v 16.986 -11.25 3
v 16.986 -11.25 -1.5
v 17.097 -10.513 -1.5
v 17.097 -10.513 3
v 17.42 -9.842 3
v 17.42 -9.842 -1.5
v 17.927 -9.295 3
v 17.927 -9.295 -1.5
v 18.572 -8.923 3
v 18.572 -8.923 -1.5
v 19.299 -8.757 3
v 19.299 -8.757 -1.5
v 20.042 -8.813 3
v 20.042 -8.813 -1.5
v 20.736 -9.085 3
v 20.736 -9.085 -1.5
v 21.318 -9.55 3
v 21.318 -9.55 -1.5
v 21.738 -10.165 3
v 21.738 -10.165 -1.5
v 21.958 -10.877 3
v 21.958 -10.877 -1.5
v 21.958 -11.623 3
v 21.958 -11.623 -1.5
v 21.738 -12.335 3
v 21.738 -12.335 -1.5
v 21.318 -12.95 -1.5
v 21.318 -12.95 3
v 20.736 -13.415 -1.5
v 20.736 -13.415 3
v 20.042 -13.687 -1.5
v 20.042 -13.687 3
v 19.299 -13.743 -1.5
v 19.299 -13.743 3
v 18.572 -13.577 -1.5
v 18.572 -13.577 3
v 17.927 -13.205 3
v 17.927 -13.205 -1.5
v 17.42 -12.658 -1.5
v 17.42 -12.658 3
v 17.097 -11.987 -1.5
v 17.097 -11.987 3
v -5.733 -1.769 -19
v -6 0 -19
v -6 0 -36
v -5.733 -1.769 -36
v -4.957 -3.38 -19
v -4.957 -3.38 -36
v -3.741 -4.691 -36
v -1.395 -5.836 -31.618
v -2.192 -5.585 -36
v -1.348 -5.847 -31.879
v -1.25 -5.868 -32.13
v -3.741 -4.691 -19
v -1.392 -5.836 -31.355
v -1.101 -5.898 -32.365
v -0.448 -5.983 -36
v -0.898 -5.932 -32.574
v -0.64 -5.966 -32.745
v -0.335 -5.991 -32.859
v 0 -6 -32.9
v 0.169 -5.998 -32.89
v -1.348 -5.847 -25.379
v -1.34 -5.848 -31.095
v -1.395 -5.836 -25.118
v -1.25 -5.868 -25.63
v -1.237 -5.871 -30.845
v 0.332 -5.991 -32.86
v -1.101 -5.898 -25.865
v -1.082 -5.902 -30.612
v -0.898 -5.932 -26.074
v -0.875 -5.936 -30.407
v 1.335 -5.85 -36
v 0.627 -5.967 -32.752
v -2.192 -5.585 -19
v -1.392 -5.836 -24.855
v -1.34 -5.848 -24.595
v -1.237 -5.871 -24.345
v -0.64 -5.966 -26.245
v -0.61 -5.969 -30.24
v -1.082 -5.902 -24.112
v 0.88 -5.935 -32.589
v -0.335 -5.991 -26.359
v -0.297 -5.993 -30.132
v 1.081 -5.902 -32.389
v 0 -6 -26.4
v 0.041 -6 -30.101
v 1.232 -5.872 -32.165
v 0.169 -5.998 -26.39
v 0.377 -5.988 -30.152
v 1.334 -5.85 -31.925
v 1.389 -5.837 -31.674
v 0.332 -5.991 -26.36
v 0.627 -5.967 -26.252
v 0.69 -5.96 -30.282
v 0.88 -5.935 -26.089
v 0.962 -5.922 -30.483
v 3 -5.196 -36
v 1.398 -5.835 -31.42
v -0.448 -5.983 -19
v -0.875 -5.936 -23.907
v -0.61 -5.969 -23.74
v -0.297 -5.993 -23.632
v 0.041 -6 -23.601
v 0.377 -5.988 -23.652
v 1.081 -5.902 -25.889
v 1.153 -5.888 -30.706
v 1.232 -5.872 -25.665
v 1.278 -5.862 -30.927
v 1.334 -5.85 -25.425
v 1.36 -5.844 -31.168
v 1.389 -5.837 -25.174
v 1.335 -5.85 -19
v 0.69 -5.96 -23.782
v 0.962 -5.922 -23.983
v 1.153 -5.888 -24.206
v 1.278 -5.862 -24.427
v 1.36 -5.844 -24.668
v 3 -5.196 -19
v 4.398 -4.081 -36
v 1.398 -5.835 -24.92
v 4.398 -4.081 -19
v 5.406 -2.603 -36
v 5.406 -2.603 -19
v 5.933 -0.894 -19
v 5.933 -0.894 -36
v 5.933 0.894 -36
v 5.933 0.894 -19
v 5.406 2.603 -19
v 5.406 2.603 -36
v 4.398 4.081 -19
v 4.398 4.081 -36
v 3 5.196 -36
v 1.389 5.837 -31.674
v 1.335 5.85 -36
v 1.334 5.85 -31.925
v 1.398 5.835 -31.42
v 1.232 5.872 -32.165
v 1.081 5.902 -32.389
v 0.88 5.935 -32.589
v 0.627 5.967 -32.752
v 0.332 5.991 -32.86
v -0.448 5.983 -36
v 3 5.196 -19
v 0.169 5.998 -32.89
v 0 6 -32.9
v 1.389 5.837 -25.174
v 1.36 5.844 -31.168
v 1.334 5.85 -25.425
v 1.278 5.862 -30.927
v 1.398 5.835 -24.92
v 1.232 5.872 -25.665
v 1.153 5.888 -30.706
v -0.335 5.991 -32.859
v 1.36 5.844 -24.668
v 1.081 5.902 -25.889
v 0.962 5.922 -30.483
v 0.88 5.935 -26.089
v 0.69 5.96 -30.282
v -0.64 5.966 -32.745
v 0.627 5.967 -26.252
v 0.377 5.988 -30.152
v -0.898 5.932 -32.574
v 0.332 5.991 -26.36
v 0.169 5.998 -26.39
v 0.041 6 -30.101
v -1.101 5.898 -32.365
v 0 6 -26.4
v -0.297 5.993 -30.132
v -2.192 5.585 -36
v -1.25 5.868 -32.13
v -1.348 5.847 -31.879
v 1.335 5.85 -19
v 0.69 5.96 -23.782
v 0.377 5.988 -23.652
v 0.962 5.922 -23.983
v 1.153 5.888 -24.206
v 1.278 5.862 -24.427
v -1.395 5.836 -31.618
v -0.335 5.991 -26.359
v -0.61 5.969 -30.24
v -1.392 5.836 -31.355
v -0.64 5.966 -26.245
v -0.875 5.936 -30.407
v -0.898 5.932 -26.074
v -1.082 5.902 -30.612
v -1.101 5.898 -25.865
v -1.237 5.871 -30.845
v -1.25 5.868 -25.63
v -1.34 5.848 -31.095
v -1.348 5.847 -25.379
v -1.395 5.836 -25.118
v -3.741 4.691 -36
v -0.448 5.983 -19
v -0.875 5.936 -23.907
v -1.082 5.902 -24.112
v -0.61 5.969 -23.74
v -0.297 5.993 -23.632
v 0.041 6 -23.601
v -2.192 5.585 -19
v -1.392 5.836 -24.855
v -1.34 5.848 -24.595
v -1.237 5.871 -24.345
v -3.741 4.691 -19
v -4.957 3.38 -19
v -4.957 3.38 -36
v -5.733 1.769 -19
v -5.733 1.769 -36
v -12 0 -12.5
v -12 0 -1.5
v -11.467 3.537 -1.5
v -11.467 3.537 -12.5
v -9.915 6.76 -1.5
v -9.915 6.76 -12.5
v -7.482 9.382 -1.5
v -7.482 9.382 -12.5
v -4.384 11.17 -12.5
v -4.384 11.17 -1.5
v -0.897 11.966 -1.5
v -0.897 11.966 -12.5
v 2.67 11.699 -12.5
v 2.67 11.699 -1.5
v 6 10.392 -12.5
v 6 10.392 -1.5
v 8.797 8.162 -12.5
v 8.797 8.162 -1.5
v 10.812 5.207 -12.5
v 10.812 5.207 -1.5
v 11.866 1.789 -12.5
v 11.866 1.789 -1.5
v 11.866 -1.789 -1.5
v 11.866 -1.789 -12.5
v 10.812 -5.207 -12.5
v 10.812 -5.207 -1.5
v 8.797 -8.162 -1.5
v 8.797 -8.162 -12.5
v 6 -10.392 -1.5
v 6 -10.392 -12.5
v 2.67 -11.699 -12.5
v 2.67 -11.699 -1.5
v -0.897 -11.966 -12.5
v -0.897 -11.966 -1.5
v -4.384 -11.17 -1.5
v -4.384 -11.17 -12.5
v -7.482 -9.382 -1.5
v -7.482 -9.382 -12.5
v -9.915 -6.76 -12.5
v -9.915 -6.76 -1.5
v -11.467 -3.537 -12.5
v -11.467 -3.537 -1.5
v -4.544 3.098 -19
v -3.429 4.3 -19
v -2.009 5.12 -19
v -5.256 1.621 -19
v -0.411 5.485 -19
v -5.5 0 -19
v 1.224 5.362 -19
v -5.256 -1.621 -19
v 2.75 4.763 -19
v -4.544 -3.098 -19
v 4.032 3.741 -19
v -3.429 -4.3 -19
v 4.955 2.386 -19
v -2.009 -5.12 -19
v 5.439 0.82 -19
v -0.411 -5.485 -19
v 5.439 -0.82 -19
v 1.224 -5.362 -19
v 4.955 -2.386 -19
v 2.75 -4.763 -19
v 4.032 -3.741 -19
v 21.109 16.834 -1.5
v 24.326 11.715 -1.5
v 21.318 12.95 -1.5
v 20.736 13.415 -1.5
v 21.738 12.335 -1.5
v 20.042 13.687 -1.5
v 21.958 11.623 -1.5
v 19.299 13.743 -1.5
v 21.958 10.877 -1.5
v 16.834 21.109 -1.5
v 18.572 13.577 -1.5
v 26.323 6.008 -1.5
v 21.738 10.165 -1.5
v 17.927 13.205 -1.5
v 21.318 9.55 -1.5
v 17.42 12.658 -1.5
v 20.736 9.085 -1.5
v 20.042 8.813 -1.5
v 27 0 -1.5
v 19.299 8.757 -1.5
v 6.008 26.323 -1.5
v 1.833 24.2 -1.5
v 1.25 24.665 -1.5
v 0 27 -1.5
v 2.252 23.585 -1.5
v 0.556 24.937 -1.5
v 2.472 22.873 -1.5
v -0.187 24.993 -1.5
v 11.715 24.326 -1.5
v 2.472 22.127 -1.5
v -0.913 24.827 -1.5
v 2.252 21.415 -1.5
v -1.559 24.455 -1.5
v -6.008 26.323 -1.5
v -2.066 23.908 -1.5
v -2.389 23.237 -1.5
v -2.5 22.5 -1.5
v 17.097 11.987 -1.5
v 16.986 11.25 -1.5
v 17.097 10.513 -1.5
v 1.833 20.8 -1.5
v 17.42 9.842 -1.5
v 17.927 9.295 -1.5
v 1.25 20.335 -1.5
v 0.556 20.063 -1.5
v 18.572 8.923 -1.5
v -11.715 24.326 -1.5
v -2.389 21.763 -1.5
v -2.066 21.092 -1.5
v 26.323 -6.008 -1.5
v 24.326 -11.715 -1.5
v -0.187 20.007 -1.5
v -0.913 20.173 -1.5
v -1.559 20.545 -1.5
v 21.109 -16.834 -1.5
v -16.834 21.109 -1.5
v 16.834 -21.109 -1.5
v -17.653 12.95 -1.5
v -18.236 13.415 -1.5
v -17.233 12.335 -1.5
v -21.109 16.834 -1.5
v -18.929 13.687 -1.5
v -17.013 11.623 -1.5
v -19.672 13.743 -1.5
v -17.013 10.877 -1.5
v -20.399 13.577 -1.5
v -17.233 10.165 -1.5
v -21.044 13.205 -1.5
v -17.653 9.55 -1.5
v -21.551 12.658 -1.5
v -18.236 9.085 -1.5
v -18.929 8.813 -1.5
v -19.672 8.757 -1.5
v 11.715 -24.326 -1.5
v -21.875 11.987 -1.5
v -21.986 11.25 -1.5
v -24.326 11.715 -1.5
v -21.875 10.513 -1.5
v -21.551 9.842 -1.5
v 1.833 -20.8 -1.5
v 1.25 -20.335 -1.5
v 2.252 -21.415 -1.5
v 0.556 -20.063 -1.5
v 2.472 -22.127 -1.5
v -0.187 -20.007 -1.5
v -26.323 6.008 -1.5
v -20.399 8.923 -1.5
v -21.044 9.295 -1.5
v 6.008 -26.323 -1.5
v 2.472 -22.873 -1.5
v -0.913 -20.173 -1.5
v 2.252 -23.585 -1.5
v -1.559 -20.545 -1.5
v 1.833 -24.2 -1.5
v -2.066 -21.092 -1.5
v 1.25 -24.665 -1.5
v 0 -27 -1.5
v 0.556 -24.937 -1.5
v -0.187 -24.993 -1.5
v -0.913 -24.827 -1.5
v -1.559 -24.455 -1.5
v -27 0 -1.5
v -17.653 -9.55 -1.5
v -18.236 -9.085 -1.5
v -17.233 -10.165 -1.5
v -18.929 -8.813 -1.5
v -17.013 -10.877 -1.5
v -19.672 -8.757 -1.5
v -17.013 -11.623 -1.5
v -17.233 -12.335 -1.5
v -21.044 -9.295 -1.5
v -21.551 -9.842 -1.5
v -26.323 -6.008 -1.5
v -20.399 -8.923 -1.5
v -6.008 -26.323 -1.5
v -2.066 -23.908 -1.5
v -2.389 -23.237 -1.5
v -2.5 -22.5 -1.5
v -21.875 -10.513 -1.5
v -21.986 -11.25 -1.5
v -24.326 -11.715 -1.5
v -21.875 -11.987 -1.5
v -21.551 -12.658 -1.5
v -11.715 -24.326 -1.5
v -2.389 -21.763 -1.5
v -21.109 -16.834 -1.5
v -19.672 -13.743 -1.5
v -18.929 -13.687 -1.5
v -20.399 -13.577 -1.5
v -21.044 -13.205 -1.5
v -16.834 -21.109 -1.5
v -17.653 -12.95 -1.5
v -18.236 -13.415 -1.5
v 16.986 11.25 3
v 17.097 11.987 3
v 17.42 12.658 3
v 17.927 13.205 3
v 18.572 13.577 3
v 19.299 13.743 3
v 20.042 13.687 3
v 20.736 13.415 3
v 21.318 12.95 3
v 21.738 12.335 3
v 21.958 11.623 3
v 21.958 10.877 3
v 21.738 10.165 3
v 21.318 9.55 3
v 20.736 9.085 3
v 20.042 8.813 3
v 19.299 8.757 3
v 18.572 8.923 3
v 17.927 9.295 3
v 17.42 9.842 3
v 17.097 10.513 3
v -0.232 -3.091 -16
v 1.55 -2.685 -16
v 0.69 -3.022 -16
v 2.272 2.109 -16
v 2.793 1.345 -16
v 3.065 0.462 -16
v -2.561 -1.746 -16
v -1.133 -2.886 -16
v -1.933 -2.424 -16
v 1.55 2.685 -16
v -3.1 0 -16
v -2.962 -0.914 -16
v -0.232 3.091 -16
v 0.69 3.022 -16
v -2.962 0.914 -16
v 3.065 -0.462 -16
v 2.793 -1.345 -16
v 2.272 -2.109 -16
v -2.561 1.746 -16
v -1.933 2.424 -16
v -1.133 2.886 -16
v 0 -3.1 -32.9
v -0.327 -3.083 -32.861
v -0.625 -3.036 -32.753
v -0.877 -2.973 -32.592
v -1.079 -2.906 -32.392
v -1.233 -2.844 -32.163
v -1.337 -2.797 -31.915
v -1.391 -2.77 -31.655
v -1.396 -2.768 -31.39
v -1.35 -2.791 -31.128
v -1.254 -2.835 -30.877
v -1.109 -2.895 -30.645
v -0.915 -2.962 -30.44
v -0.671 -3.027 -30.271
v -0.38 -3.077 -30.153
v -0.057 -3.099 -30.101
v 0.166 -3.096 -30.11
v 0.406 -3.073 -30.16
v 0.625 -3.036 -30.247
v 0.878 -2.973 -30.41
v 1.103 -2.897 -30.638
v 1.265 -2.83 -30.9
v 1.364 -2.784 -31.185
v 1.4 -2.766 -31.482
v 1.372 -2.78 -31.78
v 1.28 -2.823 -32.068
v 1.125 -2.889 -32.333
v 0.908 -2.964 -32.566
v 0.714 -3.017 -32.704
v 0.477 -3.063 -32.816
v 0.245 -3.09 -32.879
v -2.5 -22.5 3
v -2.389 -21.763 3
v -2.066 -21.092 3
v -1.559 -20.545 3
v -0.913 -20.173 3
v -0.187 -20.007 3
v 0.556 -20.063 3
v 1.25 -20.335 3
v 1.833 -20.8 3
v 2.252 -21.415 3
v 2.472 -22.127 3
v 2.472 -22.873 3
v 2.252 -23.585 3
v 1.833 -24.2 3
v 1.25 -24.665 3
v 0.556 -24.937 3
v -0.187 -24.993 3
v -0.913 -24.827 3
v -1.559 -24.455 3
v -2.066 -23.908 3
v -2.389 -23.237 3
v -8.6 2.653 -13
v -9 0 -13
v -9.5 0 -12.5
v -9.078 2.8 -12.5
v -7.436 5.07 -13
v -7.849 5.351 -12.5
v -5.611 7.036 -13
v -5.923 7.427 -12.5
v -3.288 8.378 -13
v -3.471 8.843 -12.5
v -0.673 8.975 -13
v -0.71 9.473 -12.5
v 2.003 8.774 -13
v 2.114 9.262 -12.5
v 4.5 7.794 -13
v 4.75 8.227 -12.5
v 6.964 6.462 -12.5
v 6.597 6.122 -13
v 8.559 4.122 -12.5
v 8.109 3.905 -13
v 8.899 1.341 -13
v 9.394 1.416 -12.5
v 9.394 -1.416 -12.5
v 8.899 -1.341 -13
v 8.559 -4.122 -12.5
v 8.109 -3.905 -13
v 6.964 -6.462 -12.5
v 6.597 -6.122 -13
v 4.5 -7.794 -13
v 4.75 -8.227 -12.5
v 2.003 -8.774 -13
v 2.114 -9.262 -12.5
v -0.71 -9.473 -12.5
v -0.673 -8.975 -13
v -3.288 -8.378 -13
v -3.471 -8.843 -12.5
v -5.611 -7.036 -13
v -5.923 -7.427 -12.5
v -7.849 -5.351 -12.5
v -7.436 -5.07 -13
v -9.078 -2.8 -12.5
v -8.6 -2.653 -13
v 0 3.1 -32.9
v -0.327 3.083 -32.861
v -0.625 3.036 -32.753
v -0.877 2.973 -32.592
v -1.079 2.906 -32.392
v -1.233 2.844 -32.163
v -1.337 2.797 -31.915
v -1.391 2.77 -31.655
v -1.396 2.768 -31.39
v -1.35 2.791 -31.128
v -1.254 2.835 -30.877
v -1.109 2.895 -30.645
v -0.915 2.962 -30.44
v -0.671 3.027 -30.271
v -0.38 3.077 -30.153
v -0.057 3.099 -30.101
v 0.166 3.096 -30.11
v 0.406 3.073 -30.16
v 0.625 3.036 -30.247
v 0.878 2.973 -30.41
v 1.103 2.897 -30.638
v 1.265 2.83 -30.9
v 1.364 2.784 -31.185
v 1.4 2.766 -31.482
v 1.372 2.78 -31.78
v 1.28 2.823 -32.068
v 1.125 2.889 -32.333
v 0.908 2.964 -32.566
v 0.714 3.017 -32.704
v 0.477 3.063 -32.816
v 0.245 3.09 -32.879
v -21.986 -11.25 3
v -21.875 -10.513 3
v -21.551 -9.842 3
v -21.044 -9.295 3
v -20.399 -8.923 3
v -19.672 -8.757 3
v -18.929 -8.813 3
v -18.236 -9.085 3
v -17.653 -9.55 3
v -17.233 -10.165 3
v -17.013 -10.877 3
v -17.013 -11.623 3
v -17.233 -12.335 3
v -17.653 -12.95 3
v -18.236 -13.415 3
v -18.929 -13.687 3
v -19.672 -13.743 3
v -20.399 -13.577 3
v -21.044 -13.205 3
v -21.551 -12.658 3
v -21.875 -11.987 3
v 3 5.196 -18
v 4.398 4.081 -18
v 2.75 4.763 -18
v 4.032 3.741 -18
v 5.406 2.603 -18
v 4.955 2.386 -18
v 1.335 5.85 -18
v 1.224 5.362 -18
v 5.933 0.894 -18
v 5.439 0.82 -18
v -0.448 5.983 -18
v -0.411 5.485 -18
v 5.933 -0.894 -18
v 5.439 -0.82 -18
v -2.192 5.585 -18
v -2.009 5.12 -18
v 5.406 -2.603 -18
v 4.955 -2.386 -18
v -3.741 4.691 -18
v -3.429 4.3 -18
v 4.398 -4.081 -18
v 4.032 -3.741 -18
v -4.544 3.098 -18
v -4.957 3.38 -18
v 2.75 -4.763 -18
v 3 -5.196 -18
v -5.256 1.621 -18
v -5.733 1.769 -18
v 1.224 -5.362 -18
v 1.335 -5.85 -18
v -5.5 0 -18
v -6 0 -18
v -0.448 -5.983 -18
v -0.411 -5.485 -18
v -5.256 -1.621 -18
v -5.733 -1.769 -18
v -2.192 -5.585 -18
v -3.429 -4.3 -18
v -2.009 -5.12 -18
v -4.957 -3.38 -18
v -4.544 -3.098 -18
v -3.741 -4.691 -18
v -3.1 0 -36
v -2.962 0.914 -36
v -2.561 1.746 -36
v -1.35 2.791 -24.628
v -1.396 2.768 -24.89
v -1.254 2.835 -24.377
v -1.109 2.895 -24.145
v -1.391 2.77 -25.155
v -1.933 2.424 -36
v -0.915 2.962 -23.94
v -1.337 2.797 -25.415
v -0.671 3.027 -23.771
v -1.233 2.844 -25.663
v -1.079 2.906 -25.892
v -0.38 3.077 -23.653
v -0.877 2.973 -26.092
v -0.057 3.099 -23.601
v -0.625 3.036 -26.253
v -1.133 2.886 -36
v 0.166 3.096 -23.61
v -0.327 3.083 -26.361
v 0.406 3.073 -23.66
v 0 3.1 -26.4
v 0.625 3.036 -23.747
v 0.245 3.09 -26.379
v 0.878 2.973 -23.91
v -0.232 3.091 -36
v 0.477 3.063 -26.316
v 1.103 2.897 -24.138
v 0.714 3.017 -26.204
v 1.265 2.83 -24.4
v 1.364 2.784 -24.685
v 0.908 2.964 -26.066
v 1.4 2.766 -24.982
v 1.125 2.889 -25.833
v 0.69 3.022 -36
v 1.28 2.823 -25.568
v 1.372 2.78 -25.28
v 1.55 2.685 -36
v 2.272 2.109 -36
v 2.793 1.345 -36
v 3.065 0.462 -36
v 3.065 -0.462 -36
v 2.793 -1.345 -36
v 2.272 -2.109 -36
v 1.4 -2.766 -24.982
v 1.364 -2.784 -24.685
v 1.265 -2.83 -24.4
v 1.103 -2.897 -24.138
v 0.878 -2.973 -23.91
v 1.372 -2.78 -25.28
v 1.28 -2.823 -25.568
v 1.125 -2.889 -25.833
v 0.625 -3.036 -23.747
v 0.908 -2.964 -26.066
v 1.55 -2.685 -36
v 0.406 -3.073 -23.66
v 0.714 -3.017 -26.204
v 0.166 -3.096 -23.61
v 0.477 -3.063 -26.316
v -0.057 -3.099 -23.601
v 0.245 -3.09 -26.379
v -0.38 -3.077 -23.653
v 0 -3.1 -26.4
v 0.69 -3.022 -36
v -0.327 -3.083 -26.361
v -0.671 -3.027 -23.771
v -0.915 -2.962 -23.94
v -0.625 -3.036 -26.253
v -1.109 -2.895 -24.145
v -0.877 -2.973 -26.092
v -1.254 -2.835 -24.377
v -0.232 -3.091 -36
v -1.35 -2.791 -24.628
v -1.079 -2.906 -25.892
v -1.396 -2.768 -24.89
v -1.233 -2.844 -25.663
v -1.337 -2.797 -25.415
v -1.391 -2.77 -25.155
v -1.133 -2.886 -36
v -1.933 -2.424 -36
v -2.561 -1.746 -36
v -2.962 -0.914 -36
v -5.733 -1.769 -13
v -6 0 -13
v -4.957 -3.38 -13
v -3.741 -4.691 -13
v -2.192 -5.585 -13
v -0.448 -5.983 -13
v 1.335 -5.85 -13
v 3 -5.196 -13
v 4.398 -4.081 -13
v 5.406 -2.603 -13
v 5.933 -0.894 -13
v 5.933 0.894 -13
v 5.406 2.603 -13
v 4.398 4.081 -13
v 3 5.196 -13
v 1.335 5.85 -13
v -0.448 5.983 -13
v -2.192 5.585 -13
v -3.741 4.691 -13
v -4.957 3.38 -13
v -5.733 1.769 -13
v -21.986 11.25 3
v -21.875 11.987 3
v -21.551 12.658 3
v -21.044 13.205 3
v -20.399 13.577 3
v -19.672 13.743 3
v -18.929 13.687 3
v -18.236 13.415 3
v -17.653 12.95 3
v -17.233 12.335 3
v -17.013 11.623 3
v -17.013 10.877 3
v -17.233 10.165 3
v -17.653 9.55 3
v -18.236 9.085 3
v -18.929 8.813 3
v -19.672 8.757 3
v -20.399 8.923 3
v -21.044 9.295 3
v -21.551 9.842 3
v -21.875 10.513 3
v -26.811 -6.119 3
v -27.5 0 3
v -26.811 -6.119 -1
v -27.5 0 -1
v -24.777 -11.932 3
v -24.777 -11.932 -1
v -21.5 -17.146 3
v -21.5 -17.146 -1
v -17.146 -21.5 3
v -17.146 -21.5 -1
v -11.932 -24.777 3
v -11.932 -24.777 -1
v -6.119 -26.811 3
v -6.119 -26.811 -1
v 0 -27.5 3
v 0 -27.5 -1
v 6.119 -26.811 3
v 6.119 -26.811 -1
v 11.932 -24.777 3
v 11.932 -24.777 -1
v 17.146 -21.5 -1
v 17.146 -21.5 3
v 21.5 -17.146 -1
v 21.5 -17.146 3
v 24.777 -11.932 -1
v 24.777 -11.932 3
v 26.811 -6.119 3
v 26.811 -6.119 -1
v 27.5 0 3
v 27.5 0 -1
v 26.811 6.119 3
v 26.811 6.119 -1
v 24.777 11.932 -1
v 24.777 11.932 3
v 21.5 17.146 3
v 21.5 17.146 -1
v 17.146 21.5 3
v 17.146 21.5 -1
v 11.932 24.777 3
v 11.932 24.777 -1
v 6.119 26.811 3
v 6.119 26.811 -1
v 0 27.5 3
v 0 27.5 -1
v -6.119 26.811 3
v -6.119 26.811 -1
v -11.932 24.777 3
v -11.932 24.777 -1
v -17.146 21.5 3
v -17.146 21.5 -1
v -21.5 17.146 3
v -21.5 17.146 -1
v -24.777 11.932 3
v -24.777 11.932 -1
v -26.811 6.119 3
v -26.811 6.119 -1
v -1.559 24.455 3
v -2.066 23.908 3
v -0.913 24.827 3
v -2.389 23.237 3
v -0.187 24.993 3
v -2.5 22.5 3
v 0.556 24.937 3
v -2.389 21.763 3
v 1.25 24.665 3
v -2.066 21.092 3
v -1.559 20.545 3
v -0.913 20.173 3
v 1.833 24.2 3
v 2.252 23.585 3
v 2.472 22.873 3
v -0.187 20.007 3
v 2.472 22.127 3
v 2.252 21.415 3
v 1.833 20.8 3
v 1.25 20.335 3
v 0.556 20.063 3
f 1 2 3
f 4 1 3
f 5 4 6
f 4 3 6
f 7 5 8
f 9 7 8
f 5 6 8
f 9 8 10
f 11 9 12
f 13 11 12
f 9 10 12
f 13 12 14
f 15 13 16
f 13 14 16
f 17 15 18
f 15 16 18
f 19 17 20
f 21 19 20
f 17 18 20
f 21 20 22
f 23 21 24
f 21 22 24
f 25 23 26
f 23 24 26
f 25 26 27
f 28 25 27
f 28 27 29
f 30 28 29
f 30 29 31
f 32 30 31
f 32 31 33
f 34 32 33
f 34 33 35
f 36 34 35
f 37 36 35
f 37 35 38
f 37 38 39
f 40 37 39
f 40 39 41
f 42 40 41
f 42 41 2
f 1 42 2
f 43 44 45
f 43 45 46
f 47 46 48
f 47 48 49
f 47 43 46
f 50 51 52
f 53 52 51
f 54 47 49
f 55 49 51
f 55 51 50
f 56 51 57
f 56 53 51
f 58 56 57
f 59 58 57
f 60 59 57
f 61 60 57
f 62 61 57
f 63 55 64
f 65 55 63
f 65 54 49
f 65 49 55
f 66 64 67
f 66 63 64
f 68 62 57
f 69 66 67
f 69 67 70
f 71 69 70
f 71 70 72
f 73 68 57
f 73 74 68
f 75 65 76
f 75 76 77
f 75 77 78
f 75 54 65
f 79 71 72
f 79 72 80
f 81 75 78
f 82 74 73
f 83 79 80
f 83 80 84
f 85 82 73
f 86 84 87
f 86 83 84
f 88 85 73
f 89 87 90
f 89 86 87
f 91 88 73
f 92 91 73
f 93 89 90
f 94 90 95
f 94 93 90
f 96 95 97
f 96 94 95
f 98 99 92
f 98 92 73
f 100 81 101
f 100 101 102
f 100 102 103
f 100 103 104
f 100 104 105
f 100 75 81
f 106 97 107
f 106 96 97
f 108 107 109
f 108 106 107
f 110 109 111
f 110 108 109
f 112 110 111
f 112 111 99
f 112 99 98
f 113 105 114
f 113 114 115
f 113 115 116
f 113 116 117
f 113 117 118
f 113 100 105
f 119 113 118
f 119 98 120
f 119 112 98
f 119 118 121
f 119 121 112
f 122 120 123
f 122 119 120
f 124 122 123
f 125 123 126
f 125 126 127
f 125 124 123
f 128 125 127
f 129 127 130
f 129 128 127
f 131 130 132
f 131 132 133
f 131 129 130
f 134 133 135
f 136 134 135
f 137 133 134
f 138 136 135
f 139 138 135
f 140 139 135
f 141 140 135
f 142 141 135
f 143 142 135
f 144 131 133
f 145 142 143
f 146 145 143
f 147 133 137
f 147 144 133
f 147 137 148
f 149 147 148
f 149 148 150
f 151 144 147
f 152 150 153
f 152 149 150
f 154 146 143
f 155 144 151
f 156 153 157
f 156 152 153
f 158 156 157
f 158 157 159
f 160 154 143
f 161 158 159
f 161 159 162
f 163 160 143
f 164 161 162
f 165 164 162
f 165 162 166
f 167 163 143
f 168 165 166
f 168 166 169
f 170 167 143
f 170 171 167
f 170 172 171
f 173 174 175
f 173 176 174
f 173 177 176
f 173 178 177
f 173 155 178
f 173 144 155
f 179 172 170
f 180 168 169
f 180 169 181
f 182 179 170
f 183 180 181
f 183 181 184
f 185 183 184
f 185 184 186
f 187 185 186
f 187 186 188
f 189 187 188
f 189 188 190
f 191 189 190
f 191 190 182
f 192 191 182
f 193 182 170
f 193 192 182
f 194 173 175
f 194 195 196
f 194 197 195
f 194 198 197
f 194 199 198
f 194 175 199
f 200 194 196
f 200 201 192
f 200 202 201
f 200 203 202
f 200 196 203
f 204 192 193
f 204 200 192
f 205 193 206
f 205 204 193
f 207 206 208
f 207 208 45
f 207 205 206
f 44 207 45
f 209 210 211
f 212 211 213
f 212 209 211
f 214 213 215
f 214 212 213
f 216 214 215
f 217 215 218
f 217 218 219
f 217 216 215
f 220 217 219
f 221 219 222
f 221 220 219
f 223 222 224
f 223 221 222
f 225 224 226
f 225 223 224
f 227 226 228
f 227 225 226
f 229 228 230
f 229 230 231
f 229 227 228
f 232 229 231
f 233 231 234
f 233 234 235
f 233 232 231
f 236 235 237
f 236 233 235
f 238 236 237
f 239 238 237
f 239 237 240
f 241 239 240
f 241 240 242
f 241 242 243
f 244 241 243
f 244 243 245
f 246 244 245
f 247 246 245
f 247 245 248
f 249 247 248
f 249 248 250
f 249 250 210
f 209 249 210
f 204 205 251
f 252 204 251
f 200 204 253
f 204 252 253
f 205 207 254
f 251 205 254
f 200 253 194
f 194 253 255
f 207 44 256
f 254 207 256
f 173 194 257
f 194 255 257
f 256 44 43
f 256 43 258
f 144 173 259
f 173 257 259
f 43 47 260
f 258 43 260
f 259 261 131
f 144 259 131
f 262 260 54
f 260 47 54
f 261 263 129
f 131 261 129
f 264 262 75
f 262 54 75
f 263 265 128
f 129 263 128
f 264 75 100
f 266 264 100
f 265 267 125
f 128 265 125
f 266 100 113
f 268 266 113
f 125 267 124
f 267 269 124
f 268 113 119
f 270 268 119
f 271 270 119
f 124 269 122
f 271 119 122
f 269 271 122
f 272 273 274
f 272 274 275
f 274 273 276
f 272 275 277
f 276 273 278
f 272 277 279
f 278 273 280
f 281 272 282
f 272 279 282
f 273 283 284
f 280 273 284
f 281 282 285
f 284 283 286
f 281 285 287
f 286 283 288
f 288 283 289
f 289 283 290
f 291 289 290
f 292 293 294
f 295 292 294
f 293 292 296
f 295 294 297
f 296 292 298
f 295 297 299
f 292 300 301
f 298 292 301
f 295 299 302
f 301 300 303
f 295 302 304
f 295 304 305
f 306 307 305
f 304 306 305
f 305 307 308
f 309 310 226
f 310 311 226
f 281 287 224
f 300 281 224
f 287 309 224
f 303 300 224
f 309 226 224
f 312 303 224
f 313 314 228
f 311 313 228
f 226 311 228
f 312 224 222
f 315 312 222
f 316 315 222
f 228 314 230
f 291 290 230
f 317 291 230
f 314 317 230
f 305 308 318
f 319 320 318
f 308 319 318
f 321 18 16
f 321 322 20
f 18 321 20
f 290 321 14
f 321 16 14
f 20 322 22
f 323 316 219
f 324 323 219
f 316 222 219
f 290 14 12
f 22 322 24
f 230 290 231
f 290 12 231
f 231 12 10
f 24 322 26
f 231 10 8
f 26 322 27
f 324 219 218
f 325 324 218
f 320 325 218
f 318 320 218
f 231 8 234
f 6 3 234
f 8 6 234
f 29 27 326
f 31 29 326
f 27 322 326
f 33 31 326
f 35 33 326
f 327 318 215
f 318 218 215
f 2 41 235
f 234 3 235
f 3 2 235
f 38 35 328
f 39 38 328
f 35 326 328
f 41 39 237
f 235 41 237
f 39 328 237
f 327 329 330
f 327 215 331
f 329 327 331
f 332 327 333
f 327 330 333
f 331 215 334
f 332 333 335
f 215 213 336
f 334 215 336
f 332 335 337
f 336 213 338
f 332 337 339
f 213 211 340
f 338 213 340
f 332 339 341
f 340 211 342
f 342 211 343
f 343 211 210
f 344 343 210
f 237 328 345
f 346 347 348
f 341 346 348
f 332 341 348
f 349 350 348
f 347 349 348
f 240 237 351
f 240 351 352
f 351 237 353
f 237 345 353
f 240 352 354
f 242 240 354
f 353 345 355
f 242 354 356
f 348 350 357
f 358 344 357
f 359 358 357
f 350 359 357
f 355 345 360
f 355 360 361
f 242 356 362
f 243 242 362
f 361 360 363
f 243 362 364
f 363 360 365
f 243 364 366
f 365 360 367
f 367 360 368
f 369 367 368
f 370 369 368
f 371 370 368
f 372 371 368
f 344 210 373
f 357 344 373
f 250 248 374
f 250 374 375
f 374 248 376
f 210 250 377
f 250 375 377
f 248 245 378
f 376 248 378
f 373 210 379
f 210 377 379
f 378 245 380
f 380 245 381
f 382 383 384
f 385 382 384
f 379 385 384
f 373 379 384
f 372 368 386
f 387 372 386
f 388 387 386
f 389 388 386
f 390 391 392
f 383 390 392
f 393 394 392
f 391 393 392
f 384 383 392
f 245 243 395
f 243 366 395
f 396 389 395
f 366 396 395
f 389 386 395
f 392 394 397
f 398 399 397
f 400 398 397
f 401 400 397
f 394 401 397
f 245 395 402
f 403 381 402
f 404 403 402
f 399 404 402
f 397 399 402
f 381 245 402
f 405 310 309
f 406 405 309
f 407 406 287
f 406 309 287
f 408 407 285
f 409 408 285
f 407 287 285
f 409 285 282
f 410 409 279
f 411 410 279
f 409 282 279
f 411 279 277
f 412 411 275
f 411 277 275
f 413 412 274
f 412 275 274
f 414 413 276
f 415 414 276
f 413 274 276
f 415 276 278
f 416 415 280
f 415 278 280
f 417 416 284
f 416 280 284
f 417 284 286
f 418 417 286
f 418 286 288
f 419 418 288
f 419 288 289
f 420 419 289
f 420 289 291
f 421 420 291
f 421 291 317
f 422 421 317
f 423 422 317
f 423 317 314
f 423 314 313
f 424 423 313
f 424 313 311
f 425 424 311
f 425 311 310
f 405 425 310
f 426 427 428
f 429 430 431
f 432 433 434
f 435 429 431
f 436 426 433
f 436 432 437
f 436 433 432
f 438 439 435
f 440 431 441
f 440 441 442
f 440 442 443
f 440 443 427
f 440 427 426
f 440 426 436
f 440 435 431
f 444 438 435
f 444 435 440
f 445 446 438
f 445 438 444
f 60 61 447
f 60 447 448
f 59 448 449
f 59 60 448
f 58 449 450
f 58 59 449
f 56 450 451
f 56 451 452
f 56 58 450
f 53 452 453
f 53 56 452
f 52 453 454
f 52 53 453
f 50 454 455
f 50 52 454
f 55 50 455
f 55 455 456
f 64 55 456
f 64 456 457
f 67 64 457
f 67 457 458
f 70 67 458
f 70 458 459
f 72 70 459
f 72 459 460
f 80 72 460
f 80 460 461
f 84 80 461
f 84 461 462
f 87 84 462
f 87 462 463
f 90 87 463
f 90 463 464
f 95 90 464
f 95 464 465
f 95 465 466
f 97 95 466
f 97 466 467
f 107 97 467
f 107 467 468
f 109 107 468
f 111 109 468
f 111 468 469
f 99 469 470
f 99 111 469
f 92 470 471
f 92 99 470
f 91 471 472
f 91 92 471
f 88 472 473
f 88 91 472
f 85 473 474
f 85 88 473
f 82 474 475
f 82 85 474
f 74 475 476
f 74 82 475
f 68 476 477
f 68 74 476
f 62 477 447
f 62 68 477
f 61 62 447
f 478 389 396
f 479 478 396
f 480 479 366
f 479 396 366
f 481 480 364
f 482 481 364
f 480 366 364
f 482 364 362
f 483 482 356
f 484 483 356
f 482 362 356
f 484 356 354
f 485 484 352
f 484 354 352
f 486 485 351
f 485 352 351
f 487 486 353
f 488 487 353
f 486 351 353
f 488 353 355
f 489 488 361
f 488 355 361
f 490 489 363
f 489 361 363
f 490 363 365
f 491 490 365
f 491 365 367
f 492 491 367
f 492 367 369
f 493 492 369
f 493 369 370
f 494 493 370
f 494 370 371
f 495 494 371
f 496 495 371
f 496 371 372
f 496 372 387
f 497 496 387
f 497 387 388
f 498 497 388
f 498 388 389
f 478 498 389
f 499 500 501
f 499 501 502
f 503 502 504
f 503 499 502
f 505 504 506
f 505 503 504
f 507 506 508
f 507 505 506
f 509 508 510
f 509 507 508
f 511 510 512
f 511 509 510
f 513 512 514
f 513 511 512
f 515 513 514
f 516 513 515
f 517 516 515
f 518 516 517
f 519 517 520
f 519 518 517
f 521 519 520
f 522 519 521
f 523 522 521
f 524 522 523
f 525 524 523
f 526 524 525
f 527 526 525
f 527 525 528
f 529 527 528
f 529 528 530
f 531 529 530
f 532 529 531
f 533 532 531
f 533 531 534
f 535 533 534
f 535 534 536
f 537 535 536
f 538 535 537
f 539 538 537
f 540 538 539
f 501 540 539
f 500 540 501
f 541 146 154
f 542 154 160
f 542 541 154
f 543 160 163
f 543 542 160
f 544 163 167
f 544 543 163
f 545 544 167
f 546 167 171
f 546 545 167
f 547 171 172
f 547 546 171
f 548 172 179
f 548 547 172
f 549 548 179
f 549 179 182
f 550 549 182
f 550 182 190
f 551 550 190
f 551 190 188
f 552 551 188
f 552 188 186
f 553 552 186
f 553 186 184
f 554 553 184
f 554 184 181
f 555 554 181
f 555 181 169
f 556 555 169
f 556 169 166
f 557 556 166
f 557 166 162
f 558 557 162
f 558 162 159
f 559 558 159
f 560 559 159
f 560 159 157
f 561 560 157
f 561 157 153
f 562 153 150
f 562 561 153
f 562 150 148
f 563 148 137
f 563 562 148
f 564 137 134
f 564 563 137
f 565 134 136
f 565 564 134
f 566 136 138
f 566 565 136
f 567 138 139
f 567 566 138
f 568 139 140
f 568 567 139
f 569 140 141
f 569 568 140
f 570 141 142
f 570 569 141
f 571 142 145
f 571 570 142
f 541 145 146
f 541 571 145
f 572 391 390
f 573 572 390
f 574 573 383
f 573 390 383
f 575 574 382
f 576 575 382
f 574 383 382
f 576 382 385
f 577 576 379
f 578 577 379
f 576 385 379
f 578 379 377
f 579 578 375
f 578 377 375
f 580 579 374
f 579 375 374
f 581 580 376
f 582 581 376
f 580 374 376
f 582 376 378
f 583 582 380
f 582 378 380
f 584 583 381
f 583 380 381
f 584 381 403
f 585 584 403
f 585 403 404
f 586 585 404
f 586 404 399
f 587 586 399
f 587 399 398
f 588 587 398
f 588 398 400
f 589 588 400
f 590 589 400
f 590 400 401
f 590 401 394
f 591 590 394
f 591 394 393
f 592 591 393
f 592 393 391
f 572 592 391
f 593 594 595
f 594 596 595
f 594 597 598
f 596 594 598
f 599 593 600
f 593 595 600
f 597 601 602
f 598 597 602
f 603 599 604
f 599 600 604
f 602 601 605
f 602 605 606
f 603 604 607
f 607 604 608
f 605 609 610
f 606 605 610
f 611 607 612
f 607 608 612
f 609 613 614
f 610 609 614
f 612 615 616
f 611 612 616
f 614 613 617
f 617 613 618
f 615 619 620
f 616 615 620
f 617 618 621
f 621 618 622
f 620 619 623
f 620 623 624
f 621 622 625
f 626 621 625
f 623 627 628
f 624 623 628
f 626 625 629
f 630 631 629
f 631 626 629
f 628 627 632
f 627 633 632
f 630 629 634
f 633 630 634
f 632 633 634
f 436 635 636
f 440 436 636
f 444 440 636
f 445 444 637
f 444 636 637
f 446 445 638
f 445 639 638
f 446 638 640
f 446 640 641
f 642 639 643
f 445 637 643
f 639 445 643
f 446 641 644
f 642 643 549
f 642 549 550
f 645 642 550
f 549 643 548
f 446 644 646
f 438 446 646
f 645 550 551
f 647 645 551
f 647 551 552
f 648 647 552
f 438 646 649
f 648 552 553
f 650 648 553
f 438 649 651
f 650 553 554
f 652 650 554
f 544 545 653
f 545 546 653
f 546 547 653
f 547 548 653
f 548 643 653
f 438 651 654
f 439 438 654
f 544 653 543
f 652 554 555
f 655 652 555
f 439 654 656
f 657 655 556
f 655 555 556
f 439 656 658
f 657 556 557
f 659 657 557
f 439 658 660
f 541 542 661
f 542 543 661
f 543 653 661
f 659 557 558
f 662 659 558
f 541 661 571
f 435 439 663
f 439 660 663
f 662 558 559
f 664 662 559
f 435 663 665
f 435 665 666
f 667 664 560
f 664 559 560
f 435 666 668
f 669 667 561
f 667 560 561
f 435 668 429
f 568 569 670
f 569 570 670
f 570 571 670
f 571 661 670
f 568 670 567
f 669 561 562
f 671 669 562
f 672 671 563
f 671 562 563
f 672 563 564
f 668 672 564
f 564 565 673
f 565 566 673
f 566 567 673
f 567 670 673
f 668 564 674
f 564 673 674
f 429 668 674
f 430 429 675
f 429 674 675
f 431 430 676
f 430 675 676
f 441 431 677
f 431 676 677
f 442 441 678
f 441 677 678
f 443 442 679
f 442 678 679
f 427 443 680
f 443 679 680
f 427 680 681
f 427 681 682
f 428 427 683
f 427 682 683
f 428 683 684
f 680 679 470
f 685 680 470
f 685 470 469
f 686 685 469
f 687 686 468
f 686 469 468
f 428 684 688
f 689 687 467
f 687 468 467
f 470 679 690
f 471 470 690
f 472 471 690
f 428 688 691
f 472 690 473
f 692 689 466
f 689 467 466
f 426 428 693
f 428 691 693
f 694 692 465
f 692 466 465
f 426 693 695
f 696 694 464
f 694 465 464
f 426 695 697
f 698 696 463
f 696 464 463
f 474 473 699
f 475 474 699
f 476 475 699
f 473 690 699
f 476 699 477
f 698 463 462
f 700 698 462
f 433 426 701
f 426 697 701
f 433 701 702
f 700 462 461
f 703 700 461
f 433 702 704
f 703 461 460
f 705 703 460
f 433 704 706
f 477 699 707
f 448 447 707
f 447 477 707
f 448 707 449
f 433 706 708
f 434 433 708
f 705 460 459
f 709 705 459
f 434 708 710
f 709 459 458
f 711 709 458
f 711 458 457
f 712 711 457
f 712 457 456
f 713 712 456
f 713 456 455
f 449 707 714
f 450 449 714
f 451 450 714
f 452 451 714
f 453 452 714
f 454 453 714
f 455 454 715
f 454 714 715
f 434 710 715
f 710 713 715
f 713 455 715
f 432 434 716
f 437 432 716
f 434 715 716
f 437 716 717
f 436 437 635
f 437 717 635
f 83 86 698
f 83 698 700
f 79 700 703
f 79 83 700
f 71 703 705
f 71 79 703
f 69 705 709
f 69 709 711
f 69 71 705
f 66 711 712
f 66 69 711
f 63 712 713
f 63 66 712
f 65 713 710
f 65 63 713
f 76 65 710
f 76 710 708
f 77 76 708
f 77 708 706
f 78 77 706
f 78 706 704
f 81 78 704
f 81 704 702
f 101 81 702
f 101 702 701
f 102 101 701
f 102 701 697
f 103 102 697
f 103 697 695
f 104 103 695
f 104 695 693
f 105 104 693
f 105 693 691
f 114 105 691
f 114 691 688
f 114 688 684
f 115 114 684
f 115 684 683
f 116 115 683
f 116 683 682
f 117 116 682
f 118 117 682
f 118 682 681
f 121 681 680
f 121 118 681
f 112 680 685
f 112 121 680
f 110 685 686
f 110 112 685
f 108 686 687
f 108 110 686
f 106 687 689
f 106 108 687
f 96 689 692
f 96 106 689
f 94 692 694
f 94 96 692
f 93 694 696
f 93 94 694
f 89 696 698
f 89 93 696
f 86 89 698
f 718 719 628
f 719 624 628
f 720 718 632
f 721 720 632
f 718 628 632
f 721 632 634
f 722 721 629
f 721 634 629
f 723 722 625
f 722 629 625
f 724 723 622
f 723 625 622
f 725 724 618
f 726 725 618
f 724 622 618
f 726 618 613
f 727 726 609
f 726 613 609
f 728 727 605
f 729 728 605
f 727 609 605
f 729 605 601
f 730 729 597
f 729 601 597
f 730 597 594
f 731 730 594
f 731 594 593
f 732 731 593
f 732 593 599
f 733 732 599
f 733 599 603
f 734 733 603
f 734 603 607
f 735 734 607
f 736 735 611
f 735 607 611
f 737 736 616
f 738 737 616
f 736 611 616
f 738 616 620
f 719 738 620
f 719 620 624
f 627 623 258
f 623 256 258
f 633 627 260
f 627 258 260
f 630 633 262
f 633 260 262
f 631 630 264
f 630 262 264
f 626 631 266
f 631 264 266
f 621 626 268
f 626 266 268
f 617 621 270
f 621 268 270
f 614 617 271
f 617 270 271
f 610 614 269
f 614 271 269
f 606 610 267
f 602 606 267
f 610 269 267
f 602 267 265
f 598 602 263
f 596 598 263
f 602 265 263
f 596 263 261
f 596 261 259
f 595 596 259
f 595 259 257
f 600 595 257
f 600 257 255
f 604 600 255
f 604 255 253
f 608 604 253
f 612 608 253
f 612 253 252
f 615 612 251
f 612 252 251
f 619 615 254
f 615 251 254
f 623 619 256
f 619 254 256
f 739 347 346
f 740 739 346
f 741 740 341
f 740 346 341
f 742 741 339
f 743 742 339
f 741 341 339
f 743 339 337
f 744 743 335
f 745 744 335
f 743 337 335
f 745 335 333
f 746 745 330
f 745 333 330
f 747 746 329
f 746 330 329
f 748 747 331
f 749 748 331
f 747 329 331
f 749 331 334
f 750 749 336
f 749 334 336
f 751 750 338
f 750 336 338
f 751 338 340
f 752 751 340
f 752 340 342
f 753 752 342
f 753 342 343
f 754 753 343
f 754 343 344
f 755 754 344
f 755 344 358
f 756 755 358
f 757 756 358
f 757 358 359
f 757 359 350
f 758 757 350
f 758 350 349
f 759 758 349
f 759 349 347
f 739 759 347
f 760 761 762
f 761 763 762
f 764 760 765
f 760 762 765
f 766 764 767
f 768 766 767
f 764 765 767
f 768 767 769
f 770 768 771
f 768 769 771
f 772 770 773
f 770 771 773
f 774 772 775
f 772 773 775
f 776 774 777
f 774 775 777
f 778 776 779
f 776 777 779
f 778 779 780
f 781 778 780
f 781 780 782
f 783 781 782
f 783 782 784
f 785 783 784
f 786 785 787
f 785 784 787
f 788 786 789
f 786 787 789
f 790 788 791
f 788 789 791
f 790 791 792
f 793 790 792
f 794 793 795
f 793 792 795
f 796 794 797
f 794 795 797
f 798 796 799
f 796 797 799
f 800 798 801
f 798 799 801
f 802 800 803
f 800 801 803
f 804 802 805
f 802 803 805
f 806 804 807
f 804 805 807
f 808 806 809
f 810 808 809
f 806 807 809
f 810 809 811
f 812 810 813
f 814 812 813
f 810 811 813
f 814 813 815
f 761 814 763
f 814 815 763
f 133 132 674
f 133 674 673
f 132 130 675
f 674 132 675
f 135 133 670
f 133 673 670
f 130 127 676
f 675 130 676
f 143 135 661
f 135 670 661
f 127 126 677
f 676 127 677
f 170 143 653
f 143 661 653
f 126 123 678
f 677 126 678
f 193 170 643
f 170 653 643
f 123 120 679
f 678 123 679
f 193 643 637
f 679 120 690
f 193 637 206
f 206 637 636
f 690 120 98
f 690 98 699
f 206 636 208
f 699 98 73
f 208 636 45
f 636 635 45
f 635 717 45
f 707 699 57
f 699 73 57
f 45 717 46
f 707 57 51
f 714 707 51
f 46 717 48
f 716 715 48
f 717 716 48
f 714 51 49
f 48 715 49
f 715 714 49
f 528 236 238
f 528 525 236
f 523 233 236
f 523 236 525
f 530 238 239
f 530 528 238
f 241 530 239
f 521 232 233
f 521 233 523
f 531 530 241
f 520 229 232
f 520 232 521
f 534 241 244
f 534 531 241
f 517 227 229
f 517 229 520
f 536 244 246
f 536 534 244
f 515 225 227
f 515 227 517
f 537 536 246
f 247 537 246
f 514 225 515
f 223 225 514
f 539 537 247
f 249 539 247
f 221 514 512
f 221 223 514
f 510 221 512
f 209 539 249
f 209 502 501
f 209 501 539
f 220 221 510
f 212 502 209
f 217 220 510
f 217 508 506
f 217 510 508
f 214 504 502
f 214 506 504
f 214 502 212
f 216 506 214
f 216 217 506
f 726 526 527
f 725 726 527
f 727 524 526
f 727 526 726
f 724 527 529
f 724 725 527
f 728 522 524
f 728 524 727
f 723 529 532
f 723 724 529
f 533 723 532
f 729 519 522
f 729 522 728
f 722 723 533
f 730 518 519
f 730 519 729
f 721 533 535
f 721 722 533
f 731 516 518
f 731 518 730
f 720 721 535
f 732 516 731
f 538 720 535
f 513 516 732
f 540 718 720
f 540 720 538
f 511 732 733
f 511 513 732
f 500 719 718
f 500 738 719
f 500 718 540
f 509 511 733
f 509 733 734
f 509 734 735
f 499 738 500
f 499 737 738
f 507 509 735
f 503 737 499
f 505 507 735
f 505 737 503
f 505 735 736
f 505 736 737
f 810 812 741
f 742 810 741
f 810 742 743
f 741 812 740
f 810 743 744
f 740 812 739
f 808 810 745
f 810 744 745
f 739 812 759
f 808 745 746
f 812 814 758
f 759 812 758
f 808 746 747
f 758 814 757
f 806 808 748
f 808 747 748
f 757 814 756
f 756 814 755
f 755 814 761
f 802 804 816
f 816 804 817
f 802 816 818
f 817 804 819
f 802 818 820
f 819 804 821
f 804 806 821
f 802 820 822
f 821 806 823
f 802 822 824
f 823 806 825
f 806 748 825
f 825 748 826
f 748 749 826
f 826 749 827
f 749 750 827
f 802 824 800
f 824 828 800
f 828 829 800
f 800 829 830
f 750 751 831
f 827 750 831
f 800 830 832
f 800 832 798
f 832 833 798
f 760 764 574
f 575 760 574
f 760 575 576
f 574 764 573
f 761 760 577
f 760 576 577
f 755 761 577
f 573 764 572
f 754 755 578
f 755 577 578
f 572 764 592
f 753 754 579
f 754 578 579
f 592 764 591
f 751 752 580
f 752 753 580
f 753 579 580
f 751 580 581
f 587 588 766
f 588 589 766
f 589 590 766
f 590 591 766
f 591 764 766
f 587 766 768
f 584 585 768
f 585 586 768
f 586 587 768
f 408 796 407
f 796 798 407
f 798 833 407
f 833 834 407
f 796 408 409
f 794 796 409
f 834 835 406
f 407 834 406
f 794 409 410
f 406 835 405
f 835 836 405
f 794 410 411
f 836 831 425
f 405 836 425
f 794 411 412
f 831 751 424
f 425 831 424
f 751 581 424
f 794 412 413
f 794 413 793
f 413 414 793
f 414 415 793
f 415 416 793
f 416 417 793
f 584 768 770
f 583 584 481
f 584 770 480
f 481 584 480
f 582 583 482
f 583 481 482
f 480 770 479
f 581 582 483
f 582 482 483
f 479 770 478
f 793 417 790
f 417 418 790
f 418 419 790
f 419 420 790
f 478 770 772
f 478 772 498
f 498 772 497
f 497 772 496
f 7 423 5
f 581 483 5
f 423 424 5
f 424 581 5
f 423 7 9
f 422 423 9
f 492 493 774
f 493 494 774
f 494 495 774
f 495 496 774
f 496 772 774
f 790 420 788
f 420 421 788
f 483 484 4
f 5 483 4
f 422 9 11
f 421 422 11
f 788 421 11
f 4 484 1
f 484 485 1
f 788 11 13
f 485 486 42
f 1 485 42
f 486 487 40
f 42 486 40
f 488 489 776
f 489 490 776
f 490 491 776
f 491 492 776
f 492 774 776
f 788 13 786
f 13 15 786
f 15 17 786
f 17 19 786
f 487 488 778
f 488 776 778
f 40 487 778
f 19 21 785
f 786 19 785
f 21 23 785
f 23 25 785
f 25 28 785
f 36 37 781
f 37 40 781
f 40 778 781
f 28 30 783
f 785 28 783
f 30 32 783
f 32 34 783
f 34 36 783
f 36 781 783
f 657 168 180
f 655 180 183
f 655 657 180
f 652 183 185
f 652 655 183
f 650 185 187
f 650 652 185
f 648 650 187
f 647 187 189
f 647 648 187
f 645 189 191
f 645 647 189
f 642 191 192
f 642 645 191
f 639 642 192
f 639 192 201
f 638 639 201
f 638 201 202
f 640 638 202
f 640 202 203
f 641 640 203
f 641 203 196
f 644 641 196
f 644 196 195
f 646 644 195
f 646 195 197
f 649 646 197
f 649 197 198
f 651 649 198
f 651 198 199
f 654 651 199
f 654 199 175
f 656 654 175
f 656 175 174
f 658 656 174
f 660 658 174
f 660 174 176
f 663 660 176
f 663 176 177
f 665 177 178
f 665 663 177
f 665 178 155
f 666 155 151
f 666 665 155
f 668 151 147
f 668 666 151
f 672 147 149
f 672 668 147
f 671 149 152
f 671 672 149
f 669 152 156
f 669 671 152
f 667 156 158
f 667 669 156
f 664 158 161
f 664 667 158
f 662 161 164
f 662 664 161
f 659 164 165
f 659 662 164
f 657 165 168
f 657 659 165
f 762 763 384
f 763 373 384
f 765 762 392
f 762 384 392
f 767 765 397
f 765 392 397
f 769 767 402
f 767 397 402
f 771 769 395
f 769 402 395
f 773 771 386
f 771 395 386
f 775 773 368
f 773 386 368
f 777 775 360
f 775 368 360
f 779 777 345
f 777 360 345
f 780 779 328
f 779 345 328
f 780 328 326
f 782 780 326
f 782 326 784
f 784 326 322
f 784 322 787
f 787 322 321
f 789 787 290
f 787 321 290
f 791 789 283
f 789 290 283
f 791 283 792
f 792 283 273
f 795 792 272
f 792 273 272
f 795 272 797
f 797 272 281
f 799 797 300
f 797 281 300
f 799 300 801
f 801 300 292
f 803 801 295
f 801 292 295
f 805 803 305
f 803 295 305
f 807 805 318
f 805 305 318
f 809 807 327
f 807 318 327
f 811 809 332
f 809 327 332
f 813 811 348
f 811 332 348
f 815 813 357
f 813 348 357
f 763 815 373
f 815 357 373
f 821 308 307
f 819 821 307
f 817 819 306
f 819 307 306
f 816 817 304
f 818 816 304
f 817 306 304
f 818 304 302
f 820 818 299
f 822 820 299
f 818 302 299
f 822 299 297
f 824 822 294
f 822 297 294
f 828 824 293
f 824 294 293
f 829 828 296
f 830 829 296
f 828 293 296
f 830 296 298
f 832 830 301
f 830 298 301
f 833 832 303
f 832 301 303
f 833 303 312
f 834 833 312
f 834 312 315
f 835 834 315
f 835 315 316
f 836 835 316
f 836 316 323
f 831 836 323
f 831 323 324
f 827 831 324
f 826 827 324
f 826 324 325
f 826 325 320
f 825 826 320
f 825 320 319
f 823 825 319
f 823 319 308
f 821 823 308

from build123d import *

# Parameters (mm, degrees)
SKETCH_2_R               = 6.5
CUT_EXTRUDE_1_DEPTH      = 28
CHAMFER_1_SIZE           = 0.5
SKETCH_3_R               = 2.5
CUT_EXTRUDE_2_DEPTH      = 23
SKETCH_4_R               = 3.1
CUT_EXTRUDE_3_DEPTH      = 20
SKETCH_5_R               = 16.017465931
CUT_EXTRUDE_4_DEPTH      = 30.8
SKETCH_6_R               = 12
SKETCH_6_R_2             = 9
EXTRUDE_1_DEPTH          = 13
SKETCH_7_R               = 12
SKETCH_7_R_2             = 9
CUT_EXTRUDE_5_DEPTH      = 0.5
CHAMFER_2_SIZE           = 0.5
CUT_EXTRUDE_6_DEPTH      = 20.5
CUT_EXTRUDE_6_DEPTH_BACK = 30.5
SKETCH_8_R               = 1.4


with BuildPart() as part:
    # 草图1 → 旋转1 (revolve)
    with BuildSketch(Plane(origin=(0, 0, 0), x_dir=(1, 0, 0), z_dir=(0, 1, 0))):
        Polygon((-6, 20.000076755), (-6, 36.000076755), (0, 36.000076755), (0, 30.000076755), (0, -33.8), (-9.249924022, -33.8), (-9.75, -33.299919915), (-9.75, -3), (-27.5, -3), (-27.5, 1.000001333), (-27.000001277, 1.5), (-9, 1.5), (-9, 6.5), (-9, 13.000076755), (-6, 13.000076755), (-6, 18.000076755), (-5.5, 18.000076755), (-5.5, 19.000076755), (-6, 19.000076755), align=None)
    revolve(axis=Axis((0, 0, -30.000076755), (0, 0, 1)))

    # 草图2 → 切除-拉伸1 (cut)
    with BuildSketch(Plane.XY.offset(33.8)):
        Circle(SKETCH_2_R)
    extrude(amount=-CUT_EXTRUDE_1_DEPTH, mode=Mode.SUBTRACT)

    # 倒角1
    chamfer_1_edges = [part.edges().sort_by_distance(p)[0] for p in [
        (-6.5, 0, 33.8),
    ]]
    chamfer(chamfer_1_edges, length=CHAMFER_1_SIZE)

    # 草图3 → 切除-拉伸2 (cut)
    with BuildSketch(Plane(origin=(0, 0, -1.5), x_dir=(-1, 0, 0), z_dir=(0, 0, -1))):
        with Locations((0, 22.5)):
            Circle(SKETCH_3_R)
        with Locations((19.485571585, 11.25)):
            Circle(SKETCH_3_R)
        with Locations((19.485571585, -11.25)):
            Circle(SKETCH_3_R)
        with Locations((0, -22.5)):
            Circle(SKETCH_3_R)
        with Locations((-19.485571585, -11.25)):
            Circle(SKETCH_3_R)
        with Locations((-19.485571585, 11.25)):
            Circle(SKETCH_3_R)
    extrude(amount=-CUT_EXTRUDE_2_DEPTH, mode=Mode.SUBTRACT)

    # 草图4 → 切除-拉伸3 (cut)
    with BuildSketch(Plane(origin=(0, 0, -36.000076755), x_dir=(-1, 0, 0), z_dir=(0, 0, -1))):
        Circle(SKETCH_4_R)
    extrude(amount=-CUT_EXTRUDE_3_DEPTH, mode=Mode.SUBTRACT)

    # 草图5 → 切除-拉伸4 (cut)
    with BuildSketch(Plane.XY.offset(33.8)):
        Circle(SKETCH_5_R)
    extrude(amount=-CUT_EXTRUDE_4_DEPTH, mode=Mode.SUBTRACT)

    # 草图6 → 凸台-拉伸1 (add)
    with BuildSketch(Plane(origin=(0, 0, -13.000076755), x_dir=(-1, 0, 0), z_dir=(0, 0, -1))):
        Circle(SKETCH_6_R)
        Circle(SKETCH_6_R_2, mode=Mode.SUBTRACT)
    extrude(amount=-EXTRUDE_1_DEPTH)

    # 草图7 → 切除-拉伸5 (cut)
    with BuildSketch(Plane(origin=(0, 0, -13.000076755), x_dir=(-1, 0, 0), z_dir=(0, 0, -1))):
        Circle(SKETCH_7_R)
        Circle(SKETCH_7_R_2, mode=Mode.SUBTRACT)
    extrude(amount=-CUT_EXTRUDE_5_DEPTH, mode=Mode.SUBTRACT)

    # 倒角2
    chamfer_2_edges = [part.edges().sort_by_distance(p)[0] for p in [
        (9, 0, -12.500076755),
    ]]
    chamfer(chamfer_2_edges, length=CHAMFER_2_SIZE - 0.0001)  # a hair under: the kernel refuses the full size

    # 草图8 → 切除-拉伸6 (cut, two sides: drawn at the far end of the back side and taken through both)
    with BuildSketch(Plane(origin=(0, 0, 0), x_dir=(1, 0, 0), z_dir=(0, 1, 0)).offset(-CUT_EXTRUDE_6_DEPTH_BACK)):
        with Locations(Location((0, 31.500076755, 0), (0, 0, 90))):
            Circle(SKETCH_8_R)
        with Locations(Location((0, 25.000076755, 0), (0, 0, 90))):
            Circle(SKETCH_8_R)
    extrude(amount=CUT_EXTRUDE_6_DEPTH + CUT_EXTRUDE_6_DEPTH_BACK, mode=Mode.SUBTRACT)


solid = part.part
